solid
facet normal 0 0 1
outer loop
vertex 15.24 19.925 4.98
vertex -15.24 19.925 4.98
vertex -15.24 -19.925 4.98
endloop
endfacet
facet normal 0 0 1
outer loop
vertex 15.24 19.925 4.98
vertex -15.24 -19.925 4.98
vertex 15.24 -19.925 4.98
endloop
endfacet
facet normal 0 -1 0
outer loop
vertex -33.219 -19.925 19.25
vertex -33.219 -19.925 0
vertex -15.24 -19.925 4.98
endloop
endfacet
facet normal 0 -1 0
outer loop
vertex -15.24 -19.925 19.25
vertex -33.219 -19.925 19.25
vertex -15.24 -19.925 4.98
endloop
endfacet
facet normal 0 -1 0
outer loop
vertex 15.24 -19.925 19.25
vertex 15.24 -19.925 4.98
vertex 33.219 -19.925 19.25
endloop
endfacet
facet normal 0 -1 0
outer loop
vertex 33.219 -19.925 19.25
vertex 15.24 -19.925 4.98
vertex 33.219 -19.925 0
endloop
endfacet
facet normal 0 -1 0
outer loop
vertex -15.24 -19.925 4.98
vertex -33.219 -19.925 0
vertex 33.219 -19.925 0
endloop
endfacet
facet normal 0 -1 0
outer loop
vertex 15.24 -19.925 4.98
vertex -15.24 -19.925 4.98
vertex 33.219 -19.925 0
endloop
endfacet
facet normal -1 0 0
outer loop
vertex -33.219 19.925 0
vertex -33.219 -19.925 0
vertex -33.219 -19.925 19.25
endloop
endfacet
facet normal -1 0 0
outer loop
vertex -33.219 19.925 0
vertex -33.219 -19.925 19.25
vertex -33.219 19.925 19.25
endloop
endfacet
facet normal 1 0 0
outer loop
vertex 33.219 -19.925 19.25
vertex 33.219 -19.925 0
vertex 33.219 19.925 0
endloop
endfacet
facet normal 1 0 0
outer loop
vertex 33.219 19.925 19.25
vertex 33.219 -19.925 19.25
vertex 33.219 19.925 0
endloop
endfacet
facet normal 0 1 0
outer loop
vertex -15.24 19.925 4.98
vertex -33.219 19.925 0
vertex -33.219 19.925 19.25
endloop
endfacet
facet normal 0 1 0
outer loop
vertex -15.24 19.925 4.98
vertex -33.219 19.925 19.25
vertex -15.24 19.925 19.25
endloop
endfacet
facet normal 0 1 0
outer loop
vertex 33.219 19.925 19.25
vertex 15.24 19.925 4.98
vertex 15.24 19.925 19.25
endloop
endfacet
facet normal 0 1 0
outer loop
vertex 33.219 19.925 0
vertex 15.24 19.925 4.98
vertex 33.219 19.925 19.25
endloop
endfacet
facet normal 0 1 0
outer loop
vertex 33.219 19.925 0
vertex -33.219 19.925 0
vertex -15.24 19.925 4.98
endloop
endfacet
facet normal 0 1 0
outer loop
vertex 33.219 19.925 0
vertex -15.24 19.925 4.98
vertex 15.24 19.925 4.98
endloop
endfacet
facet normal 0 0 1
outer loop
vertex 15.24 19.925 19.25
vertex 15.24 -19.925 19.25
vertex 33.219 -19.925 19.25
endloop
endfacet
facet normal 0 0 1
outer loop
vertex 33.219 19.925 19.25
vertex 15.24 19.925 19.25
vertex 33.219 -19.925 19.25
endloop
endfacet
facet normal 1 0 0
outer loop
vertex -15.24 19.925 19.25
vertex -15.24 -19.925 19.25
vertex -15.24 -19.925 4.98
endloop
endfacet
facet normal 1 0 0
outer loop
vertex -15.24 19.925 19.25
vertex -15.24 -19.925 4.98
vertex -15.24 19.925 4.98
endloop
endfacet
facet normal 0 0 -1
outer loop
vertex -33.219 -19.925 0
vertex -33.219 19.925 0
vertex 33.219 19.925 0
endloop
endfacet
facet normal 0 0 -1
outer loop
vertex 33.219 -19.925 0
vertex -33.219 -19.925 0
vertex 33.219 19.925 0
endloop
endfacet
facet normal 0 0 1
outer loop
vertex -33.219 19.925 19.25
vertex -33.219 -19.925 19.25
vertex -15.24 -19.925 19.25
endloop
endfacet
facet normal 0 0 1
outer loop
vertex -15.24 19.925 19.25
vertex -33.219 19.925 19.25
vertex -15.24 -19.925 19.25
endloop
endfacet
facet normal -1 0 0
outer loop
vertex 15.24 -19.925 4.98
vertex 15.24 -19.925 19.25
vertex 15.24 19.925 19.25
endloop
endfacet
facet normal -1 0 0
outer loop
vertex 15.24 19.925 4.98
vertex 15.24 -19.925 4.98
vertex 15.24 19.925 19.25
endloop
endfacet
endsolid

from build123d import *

# Parameters (mm, degrees)
SKETCH1_W           = 66.43745389
SKETCH1_H           = 39.85
BOSS_EXTRUDE1_DEPTH = 20
SKETCH2_W           = 30.48
SKETCH2_H           = 39.85
CUT_EXTRUDE1_DEPTH  = 15.02
SKETCH3_W           = 66.43745389
SKETCH3_H           = 39.85
CUT_EXTRUDE2_DEPTH  = 0.75


with BuildPart() as part:
    # Sketch1 → Boss-Extrude1 (new body)
    with BuildSketch(Plane.XY):
        Rectangle(SKETCH1_W, SKETCH1_H)
    extrude(amount=BOSS_EXTRUDE1_DEPTH)

    # Sketch2 → Cut-Extrude1 (cut)
    with BuildSketch(Plane.XY.offset(20)):
        Rectangle(SKETCH2_W, SKETCH2_H)
    extrude(amount=-CUT_EXTRUDE1_DEPTH, mode=Mode.SUBTRACT)

    # Sketch3 → Cut-Extrude2 (cut)
    with BuildSketch(Plane.XY.offset(20)):
        Rectangle(SKETCH3_W, SKETCH3_H)
    extrude(amount=-CUT_EXTRUDE2_DEPTH, mode=Mode.SUBTRACT)


solid = part.part
